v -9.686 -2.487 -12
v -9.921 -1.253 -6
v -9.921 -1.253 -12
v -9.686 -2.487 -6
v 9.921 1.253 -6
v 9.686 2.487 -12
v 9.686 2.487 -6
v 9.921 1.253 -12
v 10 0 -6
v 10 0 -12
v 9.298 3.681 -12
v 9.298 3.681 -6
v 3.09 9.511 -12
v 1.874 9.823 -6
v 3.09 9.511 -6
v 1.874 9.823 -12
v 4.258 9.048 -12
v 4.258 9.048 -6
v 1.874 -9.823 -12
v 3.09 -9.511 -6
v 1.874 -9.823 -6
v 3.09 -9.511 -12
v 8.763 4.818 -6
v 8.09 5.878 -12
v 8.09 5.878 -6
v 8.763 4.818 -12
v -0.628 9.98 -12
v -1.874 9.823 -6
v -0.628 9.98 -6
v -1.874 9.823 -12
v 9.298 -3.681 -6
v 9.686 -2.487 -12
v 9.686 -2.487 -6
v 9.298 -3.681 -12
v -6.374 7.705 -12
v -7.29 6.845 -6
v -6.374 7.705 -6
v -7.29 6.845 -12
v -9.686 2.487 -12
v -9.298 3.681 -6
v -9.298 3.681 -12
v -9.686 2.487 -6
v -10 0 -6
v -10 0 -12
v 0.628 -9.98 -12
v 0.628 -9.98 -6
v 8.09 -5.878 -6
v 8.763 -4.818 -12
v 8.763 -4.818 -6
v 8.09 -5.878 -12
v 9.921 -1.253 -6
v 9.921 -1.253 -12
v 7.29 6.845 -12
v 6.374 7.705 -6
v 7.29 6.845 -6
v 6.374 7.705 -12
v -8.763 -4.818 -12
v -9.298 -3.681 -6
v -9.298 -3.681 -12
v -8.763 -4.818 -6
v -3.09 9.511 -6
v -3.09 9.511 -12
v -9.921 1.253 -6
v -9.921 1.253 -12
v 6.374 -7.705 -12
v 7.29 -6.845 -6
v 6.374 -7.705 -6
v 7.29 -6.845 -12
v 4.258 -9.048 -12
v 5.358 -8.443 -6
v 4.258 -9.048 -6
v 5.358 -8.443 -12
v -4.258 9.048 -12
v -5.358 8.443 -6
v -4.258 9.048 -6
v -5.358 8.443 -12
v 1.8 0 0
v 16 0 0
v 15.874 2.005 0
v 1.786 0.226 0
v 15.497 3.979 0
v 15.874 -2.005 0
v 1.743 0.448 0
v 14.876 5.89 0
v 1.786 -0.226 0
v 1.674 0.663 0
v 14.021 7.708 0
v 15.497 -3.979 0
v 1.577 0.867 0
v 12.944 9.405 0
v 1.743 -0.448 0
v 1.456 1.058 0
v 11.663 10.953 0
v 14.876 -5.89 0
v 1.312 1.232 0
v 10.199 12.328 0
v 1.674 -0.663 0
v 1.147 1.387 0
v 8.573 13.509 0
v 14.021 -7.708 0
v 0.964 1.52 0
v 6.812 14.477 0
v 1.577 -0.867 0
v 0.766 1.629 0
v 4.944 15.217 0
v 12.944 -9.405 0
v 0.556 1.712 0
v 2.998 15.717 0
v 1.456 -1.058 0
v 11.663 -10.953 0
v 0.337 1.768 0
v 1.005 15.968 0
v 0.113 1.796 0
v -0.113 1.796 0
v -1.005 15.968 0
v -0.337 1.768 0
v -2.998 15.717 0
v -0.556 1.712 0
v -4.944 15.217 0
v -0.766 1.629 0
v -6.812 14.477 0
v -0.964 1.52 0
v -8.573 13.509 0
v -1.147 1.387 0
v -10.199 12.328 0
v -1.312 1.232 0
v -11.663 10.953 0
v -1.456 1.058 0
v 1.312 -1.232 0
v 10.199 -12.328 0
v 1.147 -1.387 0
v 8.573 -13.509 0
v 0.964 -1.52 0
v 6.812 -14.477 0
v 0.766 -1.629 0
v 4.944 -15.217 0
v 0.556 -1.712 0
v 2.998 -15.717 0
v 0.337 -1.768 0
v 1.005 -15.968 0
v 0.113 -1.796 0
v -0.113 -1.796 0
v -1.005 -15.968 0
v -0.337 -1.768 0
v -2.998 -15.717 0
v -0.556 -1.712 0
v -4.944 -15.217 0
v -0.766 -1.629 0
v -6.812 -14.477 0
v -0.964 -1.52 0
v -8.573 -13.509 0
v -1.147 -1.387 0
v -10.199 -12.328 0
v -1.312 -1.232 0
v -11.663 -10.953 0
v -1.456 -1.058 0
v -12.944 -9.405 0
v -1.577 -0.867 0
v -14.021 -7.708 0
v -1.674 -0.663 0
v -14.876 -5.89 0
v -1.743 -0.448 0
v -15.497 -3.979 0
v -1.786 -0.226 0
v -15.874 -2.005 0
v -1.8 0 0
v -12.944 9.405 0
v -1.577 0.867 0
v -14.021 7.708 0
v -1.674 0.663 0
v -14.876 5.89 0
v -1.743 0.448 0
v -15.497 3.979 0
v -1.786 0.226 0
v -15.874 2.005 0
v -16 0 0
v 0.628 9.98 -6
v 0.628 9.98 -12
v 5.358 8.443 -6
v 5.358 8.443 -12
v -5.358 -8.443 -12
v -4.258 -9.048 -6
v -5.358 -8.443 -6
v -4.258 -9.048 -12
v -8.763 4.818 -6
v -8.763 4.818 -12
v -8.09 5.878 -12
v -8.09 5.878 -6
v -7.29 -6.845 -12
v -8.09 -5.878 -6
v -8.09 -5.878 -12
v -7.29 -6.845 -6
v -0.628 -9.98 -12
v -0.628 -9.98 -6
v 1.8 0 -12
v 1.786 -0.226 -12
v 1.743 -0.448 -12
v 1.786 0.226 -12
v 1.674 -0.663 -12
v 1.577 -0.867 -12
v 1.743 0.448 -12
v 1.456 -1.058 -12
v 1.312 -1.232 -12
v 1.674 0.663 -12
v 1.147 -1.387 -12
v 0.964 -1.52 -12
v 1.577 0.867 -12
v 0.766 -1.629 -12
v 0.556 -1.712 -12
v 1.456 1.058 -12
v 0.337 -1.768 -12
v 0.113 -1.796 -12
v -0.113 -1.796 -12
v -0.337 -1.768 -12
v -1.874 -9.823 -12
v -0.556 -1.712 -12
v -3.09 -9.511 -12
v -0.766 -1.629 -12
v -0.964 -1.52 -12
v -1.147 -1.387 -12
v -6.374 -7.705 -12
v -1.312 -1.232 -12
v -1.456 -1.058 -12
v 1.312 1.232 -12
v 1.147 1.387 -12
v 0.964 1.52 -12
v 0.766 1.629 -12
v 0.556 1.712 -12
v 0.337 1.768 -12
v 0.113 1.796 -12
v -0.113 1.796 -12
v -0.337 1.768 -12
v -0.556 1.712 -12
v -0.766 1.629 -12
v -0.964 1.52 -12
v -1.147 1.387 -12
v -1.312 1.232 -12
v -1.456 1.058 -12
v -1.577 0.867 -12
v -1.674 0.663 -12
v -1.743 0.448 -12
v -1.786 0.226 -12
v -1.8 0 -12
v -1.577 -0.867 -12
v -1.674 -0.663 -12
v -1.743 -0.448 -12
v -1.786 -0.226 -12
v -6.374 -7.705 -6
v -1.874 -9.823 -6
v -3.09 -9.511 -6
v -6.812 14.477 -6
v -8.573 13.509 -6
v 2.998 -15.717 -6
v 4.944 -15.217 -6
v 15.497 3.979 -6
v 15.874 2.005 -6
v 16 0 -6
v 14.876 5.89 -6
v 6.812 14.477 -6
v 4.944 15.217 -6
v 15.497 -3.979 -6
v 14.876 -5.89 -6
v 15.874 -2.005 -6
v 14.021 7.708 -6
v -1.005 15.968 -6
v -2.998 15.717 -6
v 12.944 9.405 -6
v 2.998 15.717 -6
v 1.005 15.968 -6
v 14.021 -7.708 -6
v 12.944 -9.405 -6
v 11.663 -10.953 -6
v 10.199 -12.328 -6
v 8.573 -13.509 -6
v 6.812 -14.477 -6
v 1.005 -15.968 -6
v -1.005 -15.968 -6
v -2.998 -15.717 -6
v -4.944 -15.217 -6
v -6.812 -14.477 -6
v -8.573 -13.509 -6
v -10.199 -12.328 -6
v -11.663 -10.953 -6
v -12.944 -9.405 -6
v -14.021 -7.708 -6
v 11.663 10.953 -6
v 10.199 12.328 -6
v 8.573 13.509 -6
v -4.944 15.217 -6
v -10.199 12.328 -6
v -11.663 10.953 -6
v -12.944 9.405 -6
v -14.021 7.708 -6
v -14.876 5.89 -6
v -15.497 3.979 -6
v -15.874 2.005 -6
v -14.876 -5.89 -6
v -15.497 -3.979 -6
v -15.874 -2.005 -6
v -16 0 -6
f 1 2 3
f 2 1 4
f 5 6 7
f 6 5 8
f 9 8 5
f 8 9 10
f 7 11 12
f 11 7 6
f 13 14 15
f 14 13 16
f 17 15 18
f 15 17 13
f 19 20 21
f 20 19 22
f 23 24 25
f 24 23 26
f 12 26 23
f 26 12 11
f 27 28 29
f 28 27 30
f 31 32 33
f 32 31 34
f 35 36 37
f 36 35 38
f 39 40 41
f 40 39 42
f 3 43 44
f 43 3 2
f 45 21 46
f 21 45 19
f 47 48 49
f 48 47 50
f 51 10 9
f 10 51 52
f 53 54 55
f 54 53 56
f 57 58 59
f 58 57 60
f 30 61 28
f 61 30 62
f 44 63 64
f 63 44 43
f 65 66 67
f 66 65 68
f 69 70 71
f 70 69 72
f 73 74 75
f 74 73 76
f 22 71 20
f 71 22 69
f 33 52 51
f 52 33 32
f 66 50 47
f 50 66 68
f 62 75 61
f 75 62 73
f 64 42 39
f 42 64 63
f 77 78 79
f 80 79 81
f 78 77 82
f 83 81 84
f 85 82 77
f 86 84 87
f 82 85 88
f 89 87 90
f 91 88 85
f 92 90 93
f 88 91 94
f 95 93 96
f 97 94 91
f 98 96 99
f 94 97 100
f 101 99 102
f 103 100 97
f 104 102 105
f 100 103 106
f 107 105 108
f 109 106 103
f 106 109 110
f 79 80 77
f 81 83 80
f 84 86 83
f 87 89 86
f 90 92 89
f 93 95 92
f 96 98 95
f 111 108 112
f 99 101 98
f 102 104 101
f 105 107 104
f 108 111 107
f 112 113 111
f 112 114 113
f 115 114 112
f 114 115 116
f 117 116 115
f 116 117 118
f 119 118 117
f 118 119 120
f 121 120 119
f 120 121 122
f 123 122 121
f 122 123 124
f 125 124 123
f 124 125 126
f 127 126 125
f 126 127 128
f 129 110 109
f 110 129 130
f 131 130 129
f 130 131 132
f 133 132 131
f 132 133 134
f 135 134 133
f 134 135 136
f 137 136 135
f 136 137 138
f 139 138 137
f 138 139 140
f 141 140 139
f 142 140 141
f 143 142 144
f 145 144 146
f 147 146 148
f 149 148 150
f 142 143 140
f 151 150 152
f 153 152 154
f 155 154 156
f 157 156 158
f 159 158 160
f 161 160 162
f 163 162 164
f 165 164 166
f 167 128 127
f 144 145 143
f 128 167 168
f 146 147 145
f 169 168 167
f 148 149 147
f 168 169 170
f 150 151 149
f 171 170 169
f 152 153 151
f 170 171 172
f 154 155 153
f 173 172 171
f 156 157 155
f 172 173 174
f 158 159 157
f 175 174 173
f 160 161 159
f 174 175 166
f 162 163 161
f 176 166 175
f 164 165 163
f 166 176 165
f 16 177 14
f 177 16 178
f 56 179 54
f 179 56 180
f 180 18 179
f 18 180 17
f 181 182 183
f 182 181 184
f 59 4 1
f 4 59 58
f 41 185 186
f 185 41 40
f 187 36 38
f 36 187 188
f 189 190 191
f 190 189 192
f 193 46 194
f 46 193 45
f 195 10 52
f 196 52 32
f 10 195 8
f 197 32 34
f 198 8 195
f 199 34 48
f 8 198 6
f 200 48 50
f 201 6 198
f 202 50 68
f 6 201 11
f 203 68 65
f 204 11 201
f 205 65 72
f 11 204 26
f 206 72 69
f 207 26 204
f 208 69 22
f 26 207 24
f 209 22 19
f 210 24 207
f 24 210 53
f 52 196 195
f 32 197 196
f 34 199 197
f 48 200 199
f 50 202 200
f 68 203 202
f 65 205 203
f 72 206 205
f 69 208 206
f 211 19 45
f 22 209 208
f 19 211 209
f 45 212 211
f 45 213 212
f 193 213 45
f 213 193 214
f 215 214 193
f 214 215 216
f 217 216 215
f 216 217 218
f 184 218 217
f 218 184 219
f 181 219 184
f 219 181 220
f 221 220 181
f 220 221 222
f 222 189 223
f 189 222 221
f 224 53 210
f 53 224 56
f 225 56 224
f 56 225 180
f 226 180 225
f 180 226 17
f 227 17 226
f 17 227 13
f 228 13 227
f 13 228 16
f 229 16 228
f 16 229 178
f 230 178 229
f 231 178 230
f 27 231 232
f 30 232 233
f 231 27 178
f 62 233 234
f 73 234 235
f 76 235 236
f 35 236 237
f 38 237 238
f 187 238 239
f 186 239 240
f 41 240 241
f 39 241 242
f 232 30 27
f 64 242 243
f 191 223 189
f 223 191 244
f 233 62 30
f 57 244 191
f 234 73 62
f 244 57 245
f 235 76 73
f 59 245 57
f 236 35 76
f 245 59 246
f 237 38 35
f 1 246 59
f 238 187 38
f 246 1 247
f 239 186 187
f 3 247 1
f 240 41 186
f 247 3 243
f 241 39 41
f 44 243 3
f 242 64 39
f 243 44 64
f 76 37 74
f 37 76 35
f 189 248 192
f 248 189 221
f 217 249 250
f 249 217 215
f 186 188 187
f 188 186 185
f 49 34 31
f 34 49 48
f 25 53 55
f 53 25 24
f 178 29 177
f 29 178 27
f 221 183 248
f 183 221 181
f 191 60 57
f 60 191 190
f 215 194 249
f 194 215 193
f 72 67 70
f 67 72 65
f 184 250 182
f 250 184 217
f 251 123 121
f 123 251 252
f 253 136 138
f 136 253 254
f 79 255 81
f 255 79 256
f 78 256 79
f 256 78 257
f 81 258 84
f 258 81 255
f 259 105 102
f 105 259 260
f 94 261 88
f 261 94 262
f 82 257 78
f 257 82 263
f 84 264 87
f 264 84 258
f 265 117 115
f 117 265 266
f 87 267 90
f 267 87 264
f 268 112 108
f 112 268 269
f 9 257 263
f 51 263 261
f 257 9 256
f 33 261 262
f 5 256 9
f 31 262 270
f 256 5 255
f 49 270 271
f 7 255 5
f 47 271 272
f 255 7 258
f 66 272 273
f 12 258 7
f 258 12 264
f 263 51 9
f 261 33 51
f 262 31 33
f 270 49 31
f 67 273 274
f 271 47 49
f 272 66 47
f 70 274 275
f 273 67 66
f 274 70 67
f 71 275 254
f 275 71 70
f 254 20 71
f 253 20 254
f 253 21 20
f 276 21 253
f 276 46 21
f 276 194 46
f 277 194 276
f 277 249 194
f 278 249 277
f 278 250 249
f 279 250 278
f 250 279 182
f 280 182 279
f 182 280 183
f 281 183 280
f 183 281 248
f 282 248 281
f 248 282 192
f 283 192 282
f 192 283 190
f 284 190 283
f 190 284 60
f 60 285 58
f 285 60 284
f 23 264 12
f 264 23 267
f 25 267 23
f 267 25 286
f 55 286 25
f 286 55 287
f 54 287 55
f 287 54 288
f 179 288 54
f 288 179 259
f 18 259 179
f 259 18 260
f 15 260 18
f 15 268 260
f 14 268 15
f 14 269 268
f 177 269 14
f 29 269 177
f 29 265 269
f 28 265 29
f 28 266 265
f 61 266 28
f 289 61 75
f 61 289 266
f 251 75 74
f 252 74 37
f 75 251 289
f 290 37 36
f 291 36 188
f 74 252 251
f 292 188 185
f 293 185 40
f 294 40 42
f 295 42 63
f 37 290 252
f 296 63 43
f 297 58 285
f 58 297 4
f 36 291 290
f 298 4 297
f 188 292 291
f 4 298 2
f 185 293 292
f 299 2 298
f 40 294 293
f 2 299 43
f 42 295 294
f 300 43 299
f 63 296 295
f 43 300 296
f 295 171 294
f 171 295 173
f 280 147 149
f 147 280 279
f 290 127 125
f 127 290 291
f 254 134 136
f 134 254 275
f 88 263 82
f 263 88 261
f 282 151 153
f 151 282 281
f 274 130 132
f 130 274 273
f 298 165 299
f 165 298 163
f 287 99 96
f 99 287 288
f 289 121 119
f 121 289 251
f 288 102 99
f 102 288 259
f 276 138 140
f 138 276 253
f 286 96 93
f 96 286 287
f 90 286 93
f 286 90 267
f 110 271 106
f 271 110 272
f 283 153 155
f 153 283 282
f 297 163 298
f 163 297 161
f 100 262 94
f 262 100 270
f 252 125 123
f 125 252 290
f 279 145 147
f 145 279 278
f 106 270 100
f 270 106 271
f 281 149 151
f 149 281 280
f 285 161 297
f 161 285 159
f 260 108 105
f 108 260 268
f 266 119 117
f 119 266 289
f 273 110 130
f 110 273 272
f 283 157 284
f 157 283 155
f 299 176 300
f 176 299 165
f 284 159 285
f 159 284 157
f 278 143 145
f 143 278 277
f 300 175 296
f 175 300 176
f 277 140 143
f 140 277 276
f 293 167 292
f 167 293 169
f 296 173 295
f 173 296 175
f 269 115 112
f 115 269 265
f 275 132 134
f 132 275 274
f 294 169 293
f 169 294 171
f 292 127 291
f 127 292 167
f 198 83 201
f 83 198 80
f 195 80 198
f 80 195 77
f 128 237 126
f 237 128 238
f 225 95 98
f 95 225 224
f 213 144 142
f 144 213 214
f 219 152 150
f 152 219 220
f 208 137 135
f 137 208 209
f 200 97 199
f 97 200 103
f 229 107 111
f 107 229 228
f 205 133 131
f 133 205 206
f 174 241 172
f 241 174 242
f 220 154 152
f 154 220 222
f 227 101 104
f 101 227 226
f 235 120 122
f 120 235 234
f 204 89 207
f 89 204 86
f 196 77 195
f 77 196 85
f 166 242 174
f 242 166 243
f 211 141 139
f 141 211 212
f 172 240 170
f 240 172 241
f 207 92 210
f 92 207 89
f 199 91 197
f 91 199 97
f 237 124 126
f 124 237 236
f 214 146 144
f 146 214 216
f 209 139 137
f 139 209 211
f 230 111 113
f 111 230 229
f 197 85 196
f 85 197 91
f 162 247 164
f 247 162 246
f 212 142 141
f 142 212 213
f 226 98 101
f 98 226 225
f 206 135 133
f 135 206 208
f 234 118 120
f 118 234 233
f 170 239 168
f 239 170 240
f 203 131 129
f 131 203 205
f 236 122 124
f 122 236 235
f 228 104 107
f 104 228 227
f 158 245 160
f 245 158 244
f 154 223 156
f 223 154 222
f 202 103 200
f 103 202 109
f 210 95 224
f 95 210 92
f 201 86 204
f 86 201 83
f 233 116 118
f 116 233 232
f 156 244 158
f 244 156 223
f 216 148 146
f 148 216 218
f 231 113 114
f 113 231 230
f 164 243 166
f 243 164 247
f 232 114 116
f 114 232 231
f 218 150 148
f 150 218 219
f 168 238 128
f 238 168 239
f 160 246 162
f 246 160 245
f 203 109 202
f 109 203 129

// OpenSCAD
$fn = 50;


difference() {
	union() {
		translate(v = [0, 0, -12.0000000000]) {
			cylinder(h = 12, r = 10.0000000000);
		}
		translate(v = [0, 0, -6.0000000000]) {
			cylinder(h = 6, r = 16.0000000000);
		}
	}
	union() {
		#translate(v = [0, 0, -12]) {
			cylinder(h = 12, r = 1.8000000000);
		}
	}
}
